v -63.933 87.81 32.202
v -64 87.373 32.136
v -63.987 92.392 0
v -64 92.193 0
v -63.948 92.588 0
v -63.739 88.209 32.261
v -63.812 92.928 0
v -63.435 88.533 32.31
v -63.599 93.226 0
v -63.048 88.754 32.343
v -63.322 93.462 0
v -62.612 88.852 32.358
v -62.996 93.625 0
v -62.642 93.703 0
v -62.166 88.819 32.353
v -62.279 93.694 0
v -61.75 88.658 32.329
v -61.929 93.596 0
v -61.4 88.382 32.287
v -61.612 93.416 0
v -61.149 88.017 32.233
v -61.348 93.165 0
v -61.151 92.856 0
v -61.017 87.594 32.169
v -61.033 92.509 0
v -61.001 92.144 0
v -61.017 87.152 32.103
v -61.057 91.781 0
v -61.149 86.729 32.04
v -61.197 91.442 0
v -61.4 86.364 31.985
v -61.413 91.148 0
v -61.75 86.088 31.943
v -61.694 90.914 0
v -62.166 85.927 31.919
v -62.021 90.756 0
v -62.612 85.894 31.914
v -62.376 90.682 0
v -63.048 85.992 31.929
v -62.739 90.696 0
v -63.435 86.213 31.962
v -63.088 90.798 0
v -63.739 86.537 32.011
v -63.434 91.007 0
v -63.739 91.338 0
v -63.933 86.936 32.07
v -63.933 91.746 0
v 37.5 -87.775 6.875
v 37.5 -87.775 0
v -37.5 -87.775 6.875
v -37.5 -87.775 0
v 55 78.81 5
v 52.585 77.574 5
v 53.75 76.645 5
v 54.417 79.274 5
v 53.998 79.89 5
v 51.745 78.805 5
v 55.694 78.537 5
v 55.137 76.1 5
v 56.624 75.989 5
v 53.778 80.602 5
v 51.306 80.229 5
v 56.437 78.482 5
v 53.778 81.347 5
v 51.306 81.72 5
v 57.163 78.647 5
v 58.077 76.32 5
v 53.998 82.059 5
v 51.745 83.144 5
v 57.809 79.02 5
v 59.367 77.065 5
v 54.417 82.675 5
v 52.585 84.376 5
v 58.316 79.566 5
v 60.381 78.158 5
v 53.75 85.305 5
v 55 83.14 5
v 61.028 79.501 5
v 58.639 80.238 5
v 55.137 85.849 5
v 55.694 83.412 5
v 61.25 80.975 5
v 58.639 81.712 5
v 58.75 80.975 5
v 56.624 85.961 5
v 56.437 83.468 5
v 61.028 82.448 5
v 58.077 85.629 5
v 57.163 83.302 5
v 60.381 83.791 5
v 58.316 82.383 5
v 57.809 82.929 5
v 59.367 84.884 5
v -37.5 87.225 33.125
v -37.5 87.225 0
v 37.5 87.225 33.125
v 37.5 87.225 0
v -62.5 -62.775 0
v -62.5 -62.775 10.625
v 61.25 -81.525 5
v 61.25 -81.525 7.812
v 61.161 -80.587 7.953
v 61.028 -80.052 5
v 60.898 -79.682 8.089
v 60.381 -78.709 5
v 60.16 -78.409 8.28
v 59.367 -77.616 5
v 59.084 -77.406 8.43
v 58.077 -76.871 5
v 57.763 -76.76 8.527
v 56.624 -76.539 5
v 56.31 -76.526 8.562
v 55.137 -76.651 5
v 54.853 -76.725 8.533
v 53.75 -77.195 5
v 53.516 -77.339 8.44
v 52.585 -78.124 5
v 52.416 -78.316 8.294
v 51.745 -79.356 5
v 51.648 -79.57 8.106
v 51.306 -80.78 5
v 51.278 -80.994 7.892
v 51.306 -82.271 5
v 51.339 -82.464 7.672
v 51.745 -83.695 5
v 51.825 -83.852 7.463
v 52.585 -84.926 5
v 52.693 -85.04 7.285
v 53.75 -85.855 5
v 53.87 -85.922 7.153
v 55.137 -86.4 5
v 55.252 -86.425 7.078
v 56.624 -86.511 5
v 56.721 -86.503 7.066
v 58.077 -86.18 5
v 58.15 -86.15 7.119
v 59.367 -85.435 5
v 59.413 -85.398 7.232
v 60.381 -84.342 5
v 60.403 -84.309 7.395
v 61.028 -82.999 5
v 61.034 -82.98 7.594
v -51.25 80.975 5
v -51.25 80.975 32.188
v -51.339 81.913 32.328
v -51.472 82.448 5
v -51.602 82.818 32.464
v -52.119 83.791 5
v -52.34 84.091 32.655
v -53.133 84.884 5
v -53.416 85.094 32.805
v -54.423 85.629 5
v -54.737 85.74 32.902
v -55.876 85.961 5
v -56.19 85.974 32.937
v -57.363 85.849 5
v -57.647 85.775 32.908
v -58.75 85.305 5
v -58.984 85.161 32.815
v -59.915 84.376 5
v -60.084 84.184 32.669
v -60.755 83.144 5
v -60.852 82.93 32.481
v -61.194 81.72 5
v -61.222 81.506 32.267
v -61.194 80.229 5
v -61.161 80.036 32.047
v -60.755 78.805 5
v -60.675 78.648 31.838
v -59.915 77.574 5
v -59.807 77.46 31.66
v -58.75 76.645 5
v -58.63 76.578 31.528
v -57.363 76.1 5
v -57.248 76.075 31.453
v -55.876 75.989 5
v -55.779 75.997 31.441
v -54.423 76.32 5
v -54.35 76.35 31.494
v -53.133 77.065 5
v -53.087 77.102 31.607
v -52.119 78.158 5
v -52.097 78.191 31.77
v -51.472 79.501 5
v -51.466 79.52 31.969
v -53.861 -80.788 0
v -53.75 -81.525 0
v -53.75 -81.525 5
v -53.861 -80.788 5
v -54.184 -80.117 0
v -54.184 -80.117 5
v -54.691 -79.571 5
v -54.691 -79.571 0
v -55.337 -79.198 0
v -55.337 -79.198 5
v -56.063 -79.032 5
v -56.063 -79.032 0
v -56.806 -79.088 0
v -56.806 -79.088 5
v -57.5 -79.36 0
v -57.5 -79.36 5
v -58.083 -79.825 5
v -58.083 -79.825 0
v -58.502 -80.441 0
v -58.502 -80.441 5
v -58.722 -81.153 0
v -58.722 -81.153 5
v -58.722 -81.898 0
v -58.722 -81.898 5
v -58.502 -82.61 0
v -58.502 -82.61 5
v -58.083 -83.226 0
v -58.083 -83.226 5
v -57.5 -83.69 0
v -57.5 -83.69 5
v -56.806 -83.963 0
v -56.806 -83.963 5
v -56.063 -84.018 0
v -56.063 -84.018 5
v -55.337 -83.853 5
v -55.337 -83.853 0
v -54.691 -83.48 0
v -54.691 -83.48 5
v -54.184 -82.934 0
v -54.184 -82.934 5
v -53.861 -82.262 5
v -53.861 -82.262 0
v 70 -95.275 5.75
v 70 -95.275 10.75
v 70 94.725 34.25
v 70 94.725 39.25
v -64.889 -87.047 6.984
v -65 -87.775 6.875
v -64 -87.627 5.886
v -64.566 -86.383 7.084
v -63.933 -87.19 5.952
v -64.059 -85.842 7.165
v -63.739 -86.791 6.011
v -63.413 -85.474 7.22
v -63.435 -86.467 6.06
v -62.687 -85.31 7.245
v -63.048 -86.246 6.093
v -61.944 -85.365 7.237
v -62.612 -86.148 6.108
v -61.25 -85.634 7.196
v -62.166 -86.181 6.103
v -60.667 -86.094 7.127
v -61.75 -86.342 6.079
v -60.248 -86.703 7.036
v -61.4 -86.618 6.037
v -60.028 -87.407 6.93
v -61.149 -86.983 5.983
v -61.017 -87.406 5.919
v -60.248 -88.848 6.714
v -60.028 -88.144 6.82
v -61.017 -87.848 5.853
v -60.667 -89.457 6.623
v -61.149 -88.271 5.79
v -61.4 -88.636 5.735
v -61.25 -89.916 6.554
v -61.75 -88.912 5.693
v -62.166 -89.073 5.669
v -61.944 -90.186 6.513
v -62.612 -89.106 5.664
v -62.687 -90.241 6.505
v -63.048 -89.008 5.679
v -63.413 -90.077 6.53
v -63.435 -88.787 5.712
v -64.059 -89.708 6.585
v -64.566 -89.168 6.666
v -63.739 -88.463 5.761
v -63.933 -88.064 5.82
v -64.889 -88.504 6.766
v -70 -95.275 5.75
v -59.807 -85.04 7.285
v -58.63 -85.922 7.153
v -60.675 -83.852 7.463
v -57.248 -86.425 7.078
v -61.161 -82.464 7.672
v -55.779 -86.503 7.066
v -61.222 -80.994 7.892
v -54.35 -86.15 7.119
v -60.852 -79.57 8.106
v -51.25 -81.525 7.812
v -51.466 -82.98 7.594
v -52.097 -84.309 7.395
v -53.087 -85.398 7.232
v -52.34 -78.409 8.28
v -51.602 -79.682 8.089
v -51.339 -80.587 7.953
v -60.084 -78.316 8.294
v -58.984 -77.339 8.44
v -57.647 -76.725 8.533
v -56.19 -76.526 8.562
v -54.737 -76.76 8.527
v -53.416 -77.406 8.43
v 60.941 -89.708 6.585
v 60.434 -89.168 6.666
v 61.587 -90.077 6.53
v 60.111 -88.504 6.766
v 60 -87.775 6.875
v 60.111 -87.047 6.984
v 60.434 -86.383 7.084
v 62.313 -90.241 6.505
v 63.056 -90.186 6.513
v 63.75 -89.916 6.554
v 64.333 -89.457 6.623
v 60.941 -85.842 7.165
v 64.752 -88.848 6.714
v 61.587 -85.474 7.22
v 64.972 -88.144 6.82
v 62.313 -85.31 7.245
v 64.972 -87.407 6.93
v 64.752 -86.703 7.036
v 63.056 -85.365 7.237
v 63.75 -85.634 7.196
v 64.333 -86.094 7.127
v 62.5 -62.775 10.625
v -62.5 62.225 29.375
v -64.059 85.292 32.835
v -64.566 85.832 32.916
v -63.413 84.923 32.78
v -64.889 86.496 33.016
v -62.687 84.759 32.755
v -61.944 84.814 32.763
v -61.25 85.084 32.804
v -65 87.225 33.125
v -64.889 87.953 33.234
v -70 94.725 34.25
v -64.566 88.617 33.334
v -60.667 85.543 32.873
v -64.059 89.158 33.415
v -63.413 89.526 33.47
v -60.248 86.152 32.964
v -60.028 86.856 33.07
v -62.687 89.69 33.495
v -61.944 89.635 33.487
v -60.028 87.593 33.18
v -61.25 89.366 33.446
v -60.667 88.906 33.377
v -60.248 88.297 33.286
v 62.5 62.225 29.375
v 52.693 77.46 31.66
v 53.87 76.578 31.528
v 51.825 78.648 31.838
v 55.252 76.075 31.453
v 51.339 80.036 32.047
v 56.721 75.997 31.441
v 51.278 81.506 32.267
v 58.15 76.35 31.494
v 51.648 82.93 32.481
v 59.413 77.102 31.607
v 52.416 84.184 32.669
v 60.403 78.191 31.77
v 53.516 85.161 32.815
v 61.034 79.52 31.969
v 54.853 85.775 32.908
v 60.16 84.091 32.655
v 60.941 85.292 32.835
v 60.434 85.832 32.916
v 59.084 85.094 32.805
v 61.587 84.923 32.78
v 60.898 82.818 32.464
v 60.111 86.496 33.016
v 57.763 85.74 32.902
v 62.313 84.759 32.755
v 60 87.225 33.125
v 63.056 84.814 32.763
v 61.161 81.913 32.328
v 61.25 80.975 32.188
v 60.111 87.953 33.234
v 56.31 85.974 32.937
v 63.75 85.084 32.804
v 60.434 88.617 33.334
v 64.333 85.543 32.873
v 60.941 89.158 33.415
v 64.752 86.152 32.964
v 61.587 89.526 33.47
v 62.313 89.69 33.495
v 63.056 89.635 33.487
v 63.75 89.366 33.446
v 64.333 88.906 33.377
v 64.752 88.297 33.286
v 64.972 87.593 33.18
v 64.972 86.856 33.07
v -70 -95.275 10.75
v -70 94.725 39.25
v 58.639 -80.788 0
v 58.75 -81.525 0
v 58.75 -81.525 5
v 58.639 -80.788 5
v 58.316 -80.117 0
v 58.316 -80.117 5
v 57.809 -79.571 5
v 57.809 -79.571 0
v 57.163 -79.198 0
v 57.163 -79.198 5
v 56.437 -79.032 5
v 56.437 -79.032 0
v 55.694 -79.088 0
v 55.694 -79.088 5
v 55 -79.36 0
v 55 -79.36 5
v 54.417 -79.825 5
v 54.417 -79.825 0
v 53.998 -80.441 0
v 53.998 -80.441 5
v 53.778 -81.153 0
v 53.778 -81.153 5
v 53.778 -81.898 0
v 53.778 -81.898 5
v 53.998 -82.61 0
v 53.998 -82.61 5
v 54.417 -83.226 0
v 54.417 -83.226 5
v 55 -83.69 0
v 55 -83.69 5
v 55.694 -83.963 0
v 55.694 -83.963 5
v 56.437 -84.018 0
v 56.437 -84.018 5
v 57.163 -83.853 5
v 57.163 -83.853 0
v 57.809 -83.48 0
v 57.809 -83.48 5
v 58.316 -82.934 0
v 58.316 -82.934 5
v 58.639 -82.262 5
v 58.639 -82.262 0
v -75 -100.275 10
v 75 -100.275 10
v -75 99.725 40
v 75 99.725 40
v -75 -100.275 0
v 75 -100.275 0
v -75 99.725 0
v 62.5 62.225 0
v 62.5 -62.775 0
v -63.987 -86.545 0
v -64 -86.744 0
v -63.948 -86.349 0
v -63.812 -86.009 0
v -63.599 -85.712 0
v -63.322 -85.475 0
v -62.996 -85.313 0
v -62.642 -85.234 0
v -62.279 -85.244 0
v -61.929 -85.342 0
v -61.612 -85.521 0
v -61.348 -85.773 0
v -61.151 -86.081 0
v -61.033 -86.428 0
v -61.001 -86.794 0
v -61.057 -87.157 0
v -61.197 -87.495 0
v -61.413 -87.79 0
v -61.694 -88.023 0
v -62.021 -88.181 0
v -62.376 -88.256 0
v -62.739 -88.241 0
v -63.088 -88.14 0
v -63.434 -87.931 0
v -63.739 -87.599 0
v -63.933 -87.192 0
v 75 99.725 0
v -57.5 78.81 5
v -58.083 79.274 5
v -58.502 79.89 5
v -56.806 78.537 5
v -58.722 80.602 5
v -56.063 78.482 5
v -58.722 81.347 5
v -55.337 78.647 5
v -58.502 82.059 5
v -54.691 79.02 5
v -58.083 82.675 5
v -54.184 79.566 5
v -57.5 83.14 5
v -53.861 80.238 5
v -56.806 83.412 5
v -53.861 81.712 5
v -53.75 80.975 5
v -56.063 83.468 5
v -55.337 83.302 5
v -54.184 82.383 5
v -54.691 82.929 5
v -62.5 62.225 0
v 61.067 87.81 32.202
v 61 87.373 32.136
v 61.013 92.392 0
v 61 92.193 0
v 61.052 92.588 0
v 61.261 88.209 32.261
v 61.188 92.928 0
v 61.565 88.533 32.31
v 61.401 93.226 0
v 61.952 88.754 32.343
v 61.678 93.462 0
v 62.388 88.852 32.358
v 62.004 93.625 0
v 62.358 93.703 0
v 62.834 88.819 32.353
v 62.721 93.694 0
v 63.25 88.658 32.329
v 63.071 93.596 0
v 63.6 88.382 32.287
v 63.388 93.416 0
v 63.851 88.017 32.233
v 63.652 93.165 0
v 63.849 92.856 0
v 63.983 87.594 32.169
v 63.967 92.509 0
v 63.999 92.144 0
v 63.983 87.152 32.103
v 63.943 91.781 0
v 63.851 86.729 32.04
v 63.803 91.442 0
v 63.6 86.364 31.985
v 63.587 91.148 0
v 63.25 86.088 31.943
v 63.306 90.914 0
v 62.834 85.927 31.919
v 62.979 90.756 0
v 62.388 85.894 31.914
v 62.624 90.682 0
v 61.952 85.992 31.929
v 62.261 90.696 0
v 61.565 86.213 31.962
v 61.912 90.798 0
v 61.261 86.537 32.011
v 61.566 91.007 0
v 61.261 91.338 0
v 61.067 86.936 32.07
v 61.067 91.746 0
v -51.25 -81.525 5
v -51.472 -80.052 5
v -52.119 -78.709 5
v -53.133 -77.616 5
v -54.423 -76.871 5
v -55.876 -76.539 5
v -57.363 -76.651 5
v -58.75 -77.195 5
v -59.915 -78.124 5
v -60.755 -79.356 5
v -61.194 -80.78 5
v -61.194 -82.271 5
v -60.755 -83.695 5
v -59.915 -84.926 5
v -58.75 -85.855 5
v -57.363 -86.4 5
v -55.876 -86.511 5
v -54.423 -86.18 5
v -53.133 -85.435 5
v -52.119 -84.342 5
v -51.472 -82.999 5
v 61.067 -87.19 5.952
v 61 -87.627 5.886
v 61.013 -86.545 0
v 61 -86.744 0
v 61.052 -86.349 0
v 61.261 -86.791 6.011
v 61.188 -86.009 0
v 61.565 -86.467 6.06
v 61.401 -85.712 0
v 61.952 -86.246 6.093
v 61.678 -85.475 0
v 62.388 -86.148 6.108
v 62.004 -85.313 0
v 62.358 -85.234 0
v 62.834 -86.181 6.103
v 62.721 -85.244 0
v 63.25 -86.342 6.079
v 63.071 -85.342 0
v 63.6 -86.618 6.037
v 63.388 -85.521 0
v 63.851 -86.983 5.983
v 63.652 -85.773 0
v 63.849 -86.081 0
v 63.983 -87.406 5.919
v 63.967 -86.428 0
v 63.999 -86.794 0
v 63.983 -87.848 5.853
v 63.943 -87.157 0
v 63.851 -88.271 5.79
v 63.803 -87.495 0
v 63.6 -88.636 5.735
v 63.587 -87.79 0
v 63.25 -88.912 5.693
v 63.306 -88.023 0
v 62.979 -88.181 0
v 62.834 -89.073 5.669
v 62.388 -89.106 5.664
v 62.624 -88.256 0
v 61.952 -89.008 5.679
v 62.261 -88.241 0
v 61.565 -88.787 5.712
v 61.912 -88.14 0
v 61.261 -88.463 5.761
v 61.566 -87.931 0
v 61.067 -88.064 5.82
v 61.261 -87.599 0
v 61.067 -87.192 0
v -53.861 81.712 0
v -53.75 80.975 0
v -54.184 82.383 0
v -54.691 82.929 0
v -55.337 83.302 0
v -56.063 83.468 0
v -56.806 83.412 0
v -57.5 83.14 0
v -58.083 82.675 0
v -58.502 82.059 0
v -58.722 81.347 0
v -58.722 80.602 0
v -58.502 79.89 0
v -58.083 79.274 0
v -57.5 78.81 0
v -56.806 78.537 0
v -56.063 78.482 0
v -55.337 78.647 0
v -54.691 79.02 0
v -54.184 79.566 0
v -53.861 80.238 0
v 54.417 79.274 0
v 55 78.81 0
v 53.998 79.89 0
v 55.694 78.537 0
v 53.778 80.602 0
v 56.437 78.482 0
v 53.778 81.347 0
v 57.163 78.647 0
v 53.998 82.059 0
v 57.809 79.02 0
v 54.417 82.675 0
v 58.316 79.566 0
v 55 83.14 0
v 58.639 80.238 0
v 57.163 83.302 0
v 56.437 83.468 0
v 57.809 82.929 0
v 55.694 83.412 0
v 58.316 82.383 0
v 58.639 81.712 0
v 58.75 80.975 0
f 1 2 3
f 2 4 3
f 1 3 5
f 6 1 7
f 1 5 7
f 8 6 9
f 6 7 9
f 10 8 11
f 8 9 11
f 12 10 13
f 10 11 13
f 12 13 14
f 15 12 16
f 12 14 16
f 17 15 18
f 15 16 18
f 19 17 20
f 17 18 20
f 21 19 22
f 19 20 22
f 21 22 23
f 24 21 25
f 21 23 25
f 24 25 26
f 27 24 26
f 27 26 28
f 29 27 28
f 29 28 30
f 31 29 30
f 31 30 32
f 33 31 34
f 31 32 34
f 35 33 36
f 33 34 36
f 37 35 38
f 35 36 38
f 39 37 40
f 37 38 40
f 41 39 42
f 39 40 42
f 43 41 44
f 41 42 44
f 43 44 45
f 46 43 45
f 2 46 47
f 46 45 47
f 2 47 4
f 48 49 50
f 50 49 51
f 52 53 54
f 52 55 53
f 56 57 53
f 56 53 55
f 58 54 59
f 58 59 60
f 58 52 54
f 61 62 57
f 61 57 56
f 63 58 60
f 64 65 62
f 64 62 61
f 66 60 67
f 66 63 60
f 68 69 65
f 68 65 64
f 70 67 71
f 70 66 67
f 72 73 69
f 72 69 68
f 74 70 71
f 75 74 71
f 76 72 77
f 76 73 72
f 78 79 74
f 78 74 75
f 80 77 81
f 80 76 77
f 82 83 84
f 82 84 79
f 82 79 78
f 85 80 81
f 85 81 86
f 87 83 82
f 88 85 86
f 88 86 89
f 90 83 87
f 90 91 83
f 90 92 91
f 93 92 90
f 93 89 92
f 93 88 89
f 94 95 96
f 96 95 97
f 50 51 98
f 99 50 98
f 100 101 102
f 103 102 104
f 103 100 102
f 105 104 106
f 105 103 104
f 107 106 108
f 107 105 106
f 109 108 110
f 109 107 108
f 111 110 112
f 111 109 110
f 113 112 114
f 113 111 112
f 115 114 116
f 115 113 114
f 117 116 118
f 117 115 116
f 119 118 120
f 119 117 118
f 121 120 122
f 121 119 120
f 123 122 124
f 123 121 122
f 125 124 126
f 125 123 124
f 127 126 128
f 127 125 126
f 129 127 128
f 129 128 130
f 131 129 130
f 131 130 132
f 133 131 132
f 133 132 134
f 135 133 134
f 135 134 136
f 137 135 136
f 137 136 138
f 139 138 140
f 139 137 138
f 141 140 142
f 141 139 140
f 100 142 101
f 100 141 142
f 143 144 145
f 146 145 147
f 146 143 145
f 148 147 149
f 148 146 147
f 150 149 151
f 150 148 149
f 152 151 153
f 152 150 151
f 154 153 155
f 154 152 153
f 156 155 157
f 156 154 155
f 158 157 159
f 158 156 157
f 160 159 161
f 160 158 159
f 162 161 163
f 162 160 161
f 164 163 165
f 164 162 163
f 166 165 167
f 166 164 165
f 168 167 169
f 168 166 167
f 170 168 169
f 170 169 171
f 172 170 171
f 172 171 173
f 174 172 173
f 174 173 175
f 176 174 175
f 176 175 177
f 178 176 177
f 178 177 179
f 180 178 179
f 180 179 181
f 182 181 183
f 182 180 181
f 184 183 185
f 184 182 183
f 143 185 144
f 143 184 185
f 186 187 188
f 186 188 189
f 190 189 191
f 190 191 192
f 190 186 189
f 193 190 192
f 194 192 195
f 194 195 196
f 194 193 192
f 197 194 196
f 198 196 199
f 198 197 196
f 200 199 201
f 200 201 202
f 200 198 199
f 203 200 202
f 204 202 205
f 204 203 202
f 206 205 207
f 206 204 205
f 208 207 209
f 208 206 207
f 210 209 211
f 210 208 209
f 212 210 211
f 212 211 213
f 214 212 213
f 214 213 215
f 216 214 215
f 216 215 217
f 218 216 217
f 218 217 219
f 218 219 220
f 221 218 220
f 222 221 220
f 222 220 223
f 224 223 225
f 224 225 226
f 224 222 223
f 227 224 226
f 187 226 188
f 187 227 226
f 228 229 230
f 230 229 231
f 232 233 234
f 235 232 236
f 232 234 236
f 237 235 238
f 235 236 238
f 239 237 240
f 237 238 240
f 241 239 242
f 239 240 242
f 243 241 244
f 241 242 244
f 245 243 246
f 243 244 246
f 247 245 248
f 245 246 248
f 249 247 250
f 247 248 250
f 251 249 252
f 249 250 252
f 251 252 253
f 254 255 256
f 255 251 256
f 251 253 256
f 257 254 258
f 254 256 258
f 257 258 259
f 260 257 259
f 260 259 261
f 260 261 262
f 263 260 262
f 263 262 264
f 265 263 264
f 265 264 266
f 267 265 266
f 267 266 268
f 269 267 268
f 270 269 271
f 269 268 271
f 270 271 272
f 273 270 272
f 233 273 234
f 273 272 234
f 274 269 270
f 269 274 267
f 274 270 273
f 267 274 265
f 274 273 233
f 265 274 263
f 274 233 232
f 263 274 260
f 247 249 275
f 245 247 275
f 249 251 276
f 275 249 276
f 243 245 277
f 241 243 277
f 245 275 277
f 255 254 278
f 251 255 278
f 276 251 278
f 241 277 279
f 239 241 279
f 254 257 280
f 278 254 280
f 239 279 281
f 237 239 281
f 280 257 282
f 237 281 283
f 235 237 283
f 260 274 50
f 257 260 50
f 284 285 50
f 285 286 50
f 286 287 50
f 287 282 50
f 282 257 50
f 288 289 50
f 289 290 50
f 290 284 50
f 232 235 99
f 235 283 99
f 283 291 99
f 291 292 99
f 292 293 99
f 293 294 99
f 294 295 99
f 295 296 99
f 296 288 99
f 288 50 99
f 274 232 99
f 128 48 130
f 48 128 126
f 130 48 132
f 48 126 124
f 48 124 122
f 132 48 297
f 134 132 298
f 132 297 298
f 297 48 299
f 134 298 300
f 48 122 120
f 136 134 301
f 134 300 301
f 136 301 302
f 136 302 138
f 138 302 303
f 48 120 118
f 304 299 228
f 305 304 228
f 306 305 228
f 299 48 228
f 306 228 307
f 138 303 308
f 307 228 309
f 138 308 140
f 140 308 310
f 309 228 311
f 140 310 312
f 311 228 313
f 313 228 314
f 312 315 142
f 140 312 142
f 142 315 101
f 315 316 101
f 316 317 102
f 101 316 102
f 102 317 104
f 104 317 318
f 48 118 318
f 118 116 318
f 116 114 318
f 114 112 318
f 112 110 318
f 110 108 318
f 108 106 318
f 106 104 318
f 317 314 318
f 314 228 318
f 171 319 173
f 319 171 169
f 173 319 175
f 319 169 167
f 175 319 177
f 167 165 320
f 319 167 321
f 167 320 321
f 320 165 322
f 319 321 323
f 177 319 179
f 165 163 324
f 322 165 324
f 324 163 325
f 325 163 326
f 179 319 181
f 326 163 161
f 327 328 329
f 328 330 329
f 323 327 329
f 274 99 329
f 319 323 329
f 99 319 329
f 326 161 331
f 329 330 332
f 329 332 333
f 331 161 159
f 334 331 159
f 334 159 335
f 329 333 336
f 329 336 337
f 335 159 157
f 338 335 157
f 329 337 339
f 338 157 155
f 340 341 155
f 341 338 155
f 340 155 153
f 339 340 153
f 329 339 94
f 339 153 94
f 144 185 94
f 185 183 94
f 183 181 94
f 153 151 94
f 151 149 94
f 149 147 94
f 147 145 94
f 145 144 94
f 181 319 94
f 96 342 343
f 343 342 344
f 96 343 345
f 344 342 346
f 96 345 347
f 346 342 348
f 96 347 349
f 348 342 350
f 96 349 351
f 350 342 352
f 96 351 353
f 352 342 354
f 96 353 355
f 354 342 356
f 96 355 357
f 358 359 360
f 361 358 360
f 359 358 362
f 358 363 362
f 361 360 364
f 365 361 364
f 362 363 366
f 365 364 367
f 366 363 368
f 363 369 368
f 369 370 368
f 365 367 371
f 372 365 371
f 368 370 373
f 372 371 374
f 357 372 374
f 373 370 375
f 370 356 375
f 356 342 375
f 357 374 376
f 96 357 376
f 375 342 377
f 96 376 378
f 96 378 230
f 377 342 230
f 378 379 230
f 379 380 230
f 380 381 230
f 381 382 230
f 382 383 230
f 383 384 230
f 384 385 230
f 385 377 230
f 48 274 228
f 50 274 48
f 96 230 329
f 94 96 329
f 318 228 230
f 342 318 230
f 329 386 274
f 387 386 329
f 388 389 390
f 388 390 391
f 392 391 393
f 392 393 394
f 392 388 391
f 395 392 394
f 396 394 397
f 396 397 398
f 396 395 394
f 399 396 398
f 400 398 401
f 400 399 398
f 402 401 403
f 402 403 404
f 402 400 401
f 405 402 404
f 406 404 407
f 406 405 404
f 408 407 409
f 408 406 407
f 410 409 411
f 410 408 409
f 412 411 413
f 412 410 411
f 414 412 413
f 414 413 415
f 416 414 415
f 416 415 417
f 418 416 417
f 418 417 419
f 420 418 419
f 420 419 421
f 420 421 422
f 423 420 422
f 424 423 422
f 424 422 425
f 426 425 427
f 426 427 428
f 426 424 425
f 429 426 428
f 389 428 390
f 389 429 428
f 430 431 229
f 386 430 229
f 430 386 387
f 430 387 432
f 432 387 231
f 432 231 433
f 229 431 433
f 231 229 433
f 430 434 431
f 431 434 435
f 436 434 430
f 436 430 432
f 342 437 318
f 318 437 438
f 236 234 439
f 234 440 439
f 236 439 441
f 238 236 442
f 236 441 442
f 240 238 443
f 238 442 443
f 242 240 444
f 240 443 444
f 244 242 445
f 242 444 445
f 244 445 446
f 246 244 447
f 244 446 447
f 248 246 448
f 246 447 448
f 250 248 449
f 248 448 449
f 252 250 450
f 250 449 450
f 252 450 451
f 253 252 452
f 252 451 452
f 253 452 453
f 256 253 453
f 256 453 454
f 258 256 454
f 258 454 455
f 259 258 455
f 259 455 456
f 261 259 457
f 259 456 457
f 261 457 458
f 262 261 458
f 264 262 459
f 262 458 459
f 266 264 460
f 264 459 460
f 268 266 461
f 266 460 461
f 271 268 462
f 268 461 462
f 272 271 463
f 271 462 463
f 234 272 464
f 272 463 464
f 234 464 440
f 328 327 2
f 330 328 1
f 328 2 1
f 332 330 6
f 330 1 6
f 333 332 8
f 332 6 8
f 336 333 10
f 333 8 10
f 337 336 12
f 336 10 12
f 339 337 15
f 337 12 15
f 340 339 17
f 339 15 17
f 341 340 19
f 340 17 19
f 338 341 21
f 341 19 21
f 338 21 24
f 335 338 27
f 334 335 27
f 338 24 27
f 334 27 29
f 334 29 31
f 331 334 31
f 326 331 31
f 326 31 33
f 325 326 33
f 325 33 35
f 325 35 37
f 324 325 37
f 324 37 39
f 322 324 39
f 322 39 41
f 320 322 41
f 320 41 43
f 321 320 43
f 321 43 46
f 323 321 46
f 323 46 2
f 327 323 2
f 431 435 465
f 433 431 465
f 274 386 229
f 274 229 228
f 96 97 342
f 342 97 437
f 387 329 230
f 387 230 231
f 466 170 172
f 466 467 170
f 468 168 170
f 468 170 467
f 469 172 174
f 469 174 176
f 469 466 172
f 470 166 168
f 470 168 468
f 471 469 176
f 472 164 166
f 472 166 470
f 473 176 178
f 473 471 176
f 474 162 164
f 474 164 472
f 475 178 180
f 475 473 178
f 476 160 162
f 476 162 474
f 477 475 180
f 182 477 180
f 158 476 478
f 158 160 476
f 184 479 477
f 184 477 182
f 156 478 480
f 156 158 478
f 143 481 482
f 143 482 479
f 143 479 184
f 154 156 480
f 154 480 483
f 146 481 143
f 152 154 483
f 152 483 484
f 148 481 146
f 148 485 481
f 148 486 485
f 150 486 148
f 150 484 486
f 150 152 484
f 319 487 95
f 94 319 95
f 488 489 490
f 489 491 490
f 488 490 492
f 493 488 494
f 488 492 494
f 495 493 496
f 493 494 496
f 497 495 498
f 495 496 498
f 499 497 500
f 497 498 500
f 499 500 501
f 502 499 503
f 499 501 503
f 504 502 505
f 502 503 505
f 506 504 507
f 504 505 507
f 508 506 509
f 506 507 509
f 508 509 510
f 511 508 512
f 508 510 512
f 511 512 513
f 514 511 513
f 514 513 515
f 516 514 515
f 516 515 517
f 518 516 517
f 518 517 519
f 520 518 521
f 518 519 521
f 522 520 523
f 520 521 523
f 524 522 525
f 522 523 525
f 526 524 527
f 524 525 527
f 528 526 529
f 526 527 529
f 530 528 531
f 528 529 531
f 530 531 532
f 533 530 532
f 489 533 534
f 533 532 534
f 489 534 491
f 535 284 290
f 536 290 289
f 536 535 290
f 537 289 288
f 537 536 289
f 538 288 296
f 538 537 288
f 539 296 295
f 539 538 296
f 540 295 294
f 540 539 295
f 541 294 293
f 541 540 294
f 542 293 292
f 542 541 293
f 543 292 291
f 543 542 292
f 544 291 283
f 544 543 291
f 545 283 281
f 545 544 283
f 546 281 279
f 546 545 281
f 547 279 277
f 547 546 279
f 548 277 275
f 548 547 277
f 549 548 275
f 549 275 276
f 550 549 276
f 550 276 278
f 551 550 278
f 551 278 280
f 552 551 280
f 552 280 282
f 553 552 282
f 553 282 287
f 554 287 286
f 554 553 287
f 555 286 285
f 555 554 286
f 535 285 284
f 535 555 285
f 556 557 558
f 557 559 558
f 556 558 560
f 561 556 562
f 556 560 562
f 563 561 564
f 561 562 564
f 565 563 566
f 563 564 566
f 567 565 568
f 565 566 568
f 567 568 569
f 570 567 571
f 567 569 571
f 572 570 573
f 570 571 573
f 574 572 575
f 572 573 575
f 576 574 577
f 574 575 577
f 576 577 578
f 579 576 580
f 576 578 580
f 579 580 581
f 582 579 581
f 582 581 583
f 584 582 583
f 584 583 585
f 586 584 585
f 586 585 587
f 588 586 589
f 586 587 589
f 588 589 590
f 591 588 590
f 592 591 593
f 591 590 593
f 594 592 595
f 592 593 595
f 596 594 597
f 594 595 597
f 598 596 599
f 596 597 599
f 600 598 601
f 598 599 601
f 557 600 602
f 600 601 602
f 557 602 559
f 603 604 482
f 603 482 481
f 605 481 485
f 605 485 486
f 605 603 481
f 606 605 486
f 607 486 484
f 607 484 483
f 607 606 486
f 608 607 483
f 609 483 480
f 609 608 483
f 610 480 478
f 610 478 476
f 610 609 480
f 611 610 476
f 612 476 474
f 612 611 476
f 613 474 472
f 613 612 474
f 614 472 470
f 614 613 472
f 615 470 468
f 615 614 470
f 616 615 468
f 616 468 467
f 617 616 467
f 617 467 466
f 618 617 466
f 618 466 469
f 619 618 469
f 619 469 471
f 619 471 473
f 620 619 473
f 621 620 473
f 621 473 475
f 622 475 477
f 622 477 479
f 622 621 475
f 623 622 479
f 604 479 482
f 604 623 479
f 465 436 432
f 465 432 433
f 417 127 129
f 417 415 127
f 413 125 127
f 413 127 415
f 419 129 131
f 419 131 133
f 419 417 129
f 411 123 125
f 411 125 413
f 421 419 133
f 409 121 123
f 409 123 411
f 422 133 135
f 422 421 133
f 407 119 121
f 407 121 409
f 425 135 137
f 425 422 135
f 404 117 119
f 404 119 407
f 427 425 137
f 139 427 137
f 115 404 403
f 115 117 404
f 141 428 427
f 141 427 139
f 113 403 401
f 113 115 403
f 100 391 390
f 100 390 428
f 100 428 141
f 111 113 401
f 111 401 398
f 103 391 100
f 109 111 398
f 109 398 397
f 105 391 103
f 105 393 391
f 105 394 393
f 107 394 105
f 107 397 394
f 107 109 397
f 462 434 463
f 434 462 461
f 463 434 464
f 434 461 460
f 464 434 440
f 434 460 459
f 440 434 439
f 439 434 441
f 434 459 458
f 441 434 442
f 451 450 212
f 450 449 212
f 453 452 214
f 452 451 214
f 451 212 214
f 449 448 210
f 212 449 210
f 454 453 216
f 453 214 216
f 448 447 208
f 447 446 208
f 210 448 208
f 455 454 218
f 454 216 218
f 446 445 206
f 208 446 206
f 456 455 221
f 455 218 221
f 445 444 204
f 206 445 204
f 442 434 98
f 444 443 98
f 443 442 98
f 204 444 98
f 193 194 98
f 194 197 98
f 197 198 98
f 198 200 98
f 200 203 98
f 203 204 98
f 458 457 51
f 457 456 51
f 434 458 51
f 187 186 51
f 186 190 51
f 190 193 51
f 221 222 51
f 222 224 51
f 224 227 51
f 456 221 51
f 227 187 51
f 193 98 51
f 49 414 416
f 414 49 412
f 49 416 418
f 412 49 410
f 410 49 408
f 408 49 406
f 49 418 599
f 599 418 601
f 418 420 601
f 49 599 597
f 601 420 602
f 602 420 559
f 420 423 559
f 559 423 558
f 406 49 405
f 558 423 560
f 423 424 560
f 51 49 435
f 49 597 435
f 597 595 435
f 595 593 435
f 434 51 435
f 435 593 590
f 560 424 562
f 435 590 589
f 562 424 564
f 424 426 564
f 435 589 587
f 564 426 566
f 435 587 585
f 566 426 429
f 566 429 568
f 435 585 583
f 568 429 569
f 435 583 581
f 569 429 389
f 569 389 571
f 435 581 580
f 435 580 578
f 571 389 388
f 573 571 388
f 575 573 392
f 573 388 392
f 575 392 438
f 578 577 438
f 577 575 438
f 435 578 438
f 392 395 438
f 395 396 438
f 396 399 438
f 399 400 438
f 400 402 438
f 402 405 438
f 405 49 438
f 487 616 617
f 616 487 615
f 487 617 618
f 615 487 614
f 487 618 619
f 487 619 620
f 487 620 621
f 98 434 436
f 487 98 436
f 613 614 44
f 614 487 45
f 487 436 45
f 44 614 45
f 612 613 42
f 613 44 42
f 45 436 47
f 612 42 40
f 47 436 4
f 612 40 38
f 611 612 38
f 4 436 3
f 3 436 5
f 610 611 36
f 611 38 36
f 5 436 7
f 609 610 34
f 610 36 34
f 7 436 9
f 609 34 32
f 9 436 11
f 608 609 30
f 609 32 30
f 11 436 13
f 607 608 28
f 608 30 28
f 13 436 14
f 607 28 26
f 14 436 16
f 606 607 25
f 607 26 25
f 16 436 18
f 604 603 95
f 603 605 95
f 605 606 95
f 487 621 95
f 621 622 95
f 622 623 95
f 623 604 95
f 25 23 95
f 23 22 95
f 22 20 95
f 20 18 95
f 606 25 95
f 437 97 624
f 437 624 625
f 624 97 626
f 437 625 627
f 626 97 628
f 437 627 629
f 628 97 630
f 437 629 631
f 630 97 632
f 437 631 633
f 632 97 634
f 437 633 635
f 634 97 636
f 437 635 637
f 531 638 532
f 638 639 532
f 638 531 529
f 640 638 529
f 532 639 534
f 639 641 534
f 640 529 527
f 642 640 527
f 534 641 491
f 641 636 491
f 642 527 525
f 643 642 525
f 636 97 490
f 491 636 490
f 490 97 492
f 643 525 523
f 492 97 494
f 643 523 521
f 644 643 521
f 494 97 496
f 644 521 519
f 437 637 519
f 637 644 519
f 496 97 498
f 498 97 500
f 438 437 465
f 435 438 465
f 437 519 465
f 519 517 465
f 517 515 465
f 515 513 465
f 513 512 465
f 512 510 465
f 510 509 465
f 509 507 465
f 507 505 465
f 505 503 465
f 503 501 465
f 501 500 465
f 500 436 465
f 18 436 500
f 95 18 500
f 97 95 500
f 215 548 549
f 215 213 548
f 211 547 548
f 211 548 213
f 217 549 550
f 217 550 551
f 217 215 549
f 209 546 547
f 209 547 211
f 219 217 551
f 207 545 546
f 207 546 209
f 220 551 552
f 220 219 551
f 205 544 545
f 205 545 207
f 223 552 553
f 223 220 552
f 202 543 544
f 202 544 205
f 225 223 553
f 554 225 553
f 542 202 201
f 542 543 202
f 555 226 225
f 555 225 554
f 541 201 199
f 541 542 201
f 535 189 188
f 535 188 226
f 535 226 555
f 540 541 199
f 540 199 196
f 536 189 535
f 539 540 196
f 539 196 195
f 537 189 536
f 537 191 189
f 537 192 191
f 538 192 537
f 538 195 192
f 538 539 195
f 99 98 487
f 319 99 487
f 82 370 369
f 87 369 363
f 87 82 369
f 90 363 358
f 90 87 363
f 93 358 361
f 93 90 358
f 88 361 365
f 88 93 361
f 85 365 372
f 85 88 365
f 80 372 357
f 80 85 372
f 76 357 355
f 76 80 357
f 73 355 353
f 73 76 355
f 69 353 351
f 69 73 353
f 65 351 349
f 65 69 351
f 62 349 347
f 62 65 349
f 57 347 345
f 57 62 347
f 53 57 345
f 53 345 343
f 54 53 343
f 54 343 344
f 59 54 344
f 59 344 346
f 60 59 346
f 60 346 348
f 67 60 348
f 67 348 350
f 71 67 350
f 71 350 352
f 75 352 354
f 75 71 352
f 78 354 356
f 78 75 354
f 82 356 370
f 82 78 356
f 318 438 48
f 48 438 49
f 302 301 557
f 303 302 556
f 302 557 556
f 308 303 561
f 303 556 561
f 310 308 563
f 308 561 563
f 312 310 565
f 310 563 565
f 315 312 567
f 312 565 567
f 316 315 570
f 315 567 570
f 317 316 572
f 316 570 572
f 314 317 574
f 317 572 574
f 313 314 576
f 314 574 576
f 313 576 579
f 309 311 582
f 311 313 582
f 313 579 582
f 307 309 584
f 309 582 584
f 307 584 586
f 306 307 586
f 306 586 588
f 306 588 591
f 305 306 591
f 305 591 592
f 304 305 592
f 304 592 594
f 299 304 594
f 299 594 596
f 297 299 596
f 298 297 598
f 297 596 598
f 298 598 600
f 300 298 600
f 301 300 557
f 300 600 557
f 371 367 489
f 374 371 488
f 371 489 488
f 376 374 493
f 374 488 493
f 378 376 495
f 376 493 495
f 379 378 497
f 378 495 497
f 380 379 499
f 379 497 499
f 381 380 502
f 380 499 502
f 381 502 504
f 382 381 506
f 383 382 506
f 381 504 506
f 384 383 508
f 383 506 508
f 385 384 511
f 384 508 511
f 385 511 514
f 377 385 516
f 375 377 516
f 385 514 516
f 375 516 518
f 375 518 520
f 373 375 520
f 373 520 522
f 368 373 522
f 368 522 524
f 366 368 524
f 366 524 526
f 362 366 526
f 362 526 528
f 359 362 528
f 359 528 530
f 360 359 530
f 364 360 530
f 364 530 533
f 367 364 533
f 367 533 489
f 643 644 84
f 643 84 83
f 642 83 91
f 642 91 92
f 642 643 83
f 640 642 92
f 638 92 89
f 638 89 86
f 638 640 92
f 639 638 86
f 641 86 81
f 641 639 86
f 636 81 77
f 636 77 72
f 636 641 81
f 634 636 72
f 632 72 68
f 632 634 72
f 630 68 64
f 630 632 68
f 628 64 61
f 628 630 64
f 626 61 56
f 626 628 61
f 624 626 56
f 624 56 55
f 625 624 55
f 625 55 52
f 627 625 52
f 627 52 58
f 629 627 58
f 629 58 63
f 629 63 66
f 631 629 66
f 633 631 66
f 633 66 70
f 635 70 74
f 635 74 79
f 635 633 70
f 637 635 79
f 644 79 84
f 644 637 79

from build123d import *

# Parameters (mm, degrees)
F0_W           = 150
F0_H           = 200
F0_W_2         = 137.5
F0_H_2         = 187.5
F0_R           = 5
F1_DEPTH       = 40
F3_DEPTH       = 155
F5_START       = -5
F5_DEPTH       = 140
F0_R_2         = 2.5
F6_DEPTH       = 5
F8_D           = 3
F8_CSINK_D     = 5
F8_CSINK_ANGLE = 90


with BuildPart() as f1:
    # F0 (on Top) → F1 (new body)
    with BuildSketch(Plane.XY):
        with Locations((2.626e-07, -0.2753496519)):
            Rectangle(F0_W, F0_H)
        with Locations((2.626e-07, -0.2753496519)):
            Rectangle(F0_W_2, F0_H_2, mode=Mode.SUBTRACT)
        with Locations((2.626e-07, -0.2753496519)):
            Rectangle(F0_W_2, F0_H_2)
        Polygon((-62.4999997374, 62.2246503481), (-62.4999997374, 87.2246503481), (-37.4999997374, 87.2246503481), (37.5000002626, 87.2246503481), (62.5000002626, 87.2246503481), (62.5000002626, 62.2246503481), (62.5000002626, -62.7753496519), (62.5000002626, -87.7753496519), (37.5000002626, -87.7753496519), (-37.4999997374, -87.7753496519), (-62.4999997374, -87.7753496519), (-62.4999997374, -62.7753496519), align=None, mode=Mode.SUBTRACT)
        Polygon((62.5000002626, 87.2246503481), (37.5000002626, 87.2246503481), (62.5000002626, 62.2246503481), align=None)
        with Locations((56.2500002626, 80.9746503481)):
            Circle(F0_R, mode=Mode.SUBTRACT)
        Polygon((-37.4999997374, 87.2246503481), (-62.4999997374, 87.2246503481), (-62.4999997374, 62.2246503481), align=None)
        with Locations((-56.2499997374, 80.9746503481)):
            Circle(F0_R, mode=Mode.SUBTRACT)
        Polygon((-37.4999997374, -87.7753496519), (-62.4999997374, -62.7753496519), (-62.4999997374, -87.7753496519), align=None)
        with Locations((-56.2499997374, -81.5253496519)):
            Circle(F0_R, mode=Mode.SUBTRACT)
        Polygon((62.5000002626, -87.7753496519), (62.5000002626, -62.7753496519), (37.5000002626, -87.7753496519), align=None)
        with Locations((56.2500002626, -81.5253496519)):
            Circle(F0_R, mode=Mode.SUBTRACT)
    extrude(amount=F1_DEPTH)

    # F2 (on face) → F3 (cut)
    with BuildSketch(Plane.YZ.offset(75.0000002626)):
        Polygon((99.7246503481, 40), (-100.2753496519, 40), (-100.2753496519, 10), align=None)
    extrude(amount=-F3_DEPTH, mode=Mode.SUBTRACT)

    # F4 (on face) → F5 (cut)
    with BuildSketch(Plane.YZ.offset(75.0000002626).offset(F5_START)):
        Polygon((94.7246503481, 39.25), (-95.2753496519, 10.75), (-95.2753496519, 5.75), (94.7246503481, 34.25), align=None)
    extrude(amount=-F5_DEPTH, mode=Mode.SUBTRACT)

    # F0 (on Top) → F6 (join)
    with BuildSketch(Plane.XY):
        with Locations((-56.2499997374, 80.9746503481)):
            Circle(F0_R)
        with Locations((-56.2499997374, 80.9746503481)):
            Circle(F0_R_2, mode=Mode.SUBTRACT)
        with Locations((56.2500002626, 80.9746503481)):
            Circle(F0_R)
        with Locations((56.2500002626, 80.9746503481)):
            Circle(F0_R_2, mode=Mode.SUBTRACT)
        with Locations((56.2500002626, -81.5253496519)):
            Circle(F0_R)
        with Locations((56.2500002626, -81.5253496519)):
            Circle(F0_R_2, mode=Mode.SUBTRACT)
        with Locations((-56.2499997374, -81.5253496519)):
            Circle(F0_R)
        with Locations((-56.2499997374, -81.5253496519)):
            Circle(F0_R_2, mode=Mode.SUBTRACT)
    extrude(amount=F6_DEPTH)

    # F8 (through all)
    with Locations(Plane(origin=(0, -2.9400443689, 19.6002957925), x_dir=(1, 0, 0), z_dir=(0, -0.1483404529, 0.9889363529))):
        with Locations((-62.4999997374, -85.7843935426), (-62.4999997374, 91.1734050987), (62.5000002626, 91.1734050987), (62.5000002626, -85.7843935426)):
            CounterSinkHole(F8_D / 2, F8_CSINK_D / 2, counter_sink_angle=F8_CSINK_ANGLE)


solid = f1.part
